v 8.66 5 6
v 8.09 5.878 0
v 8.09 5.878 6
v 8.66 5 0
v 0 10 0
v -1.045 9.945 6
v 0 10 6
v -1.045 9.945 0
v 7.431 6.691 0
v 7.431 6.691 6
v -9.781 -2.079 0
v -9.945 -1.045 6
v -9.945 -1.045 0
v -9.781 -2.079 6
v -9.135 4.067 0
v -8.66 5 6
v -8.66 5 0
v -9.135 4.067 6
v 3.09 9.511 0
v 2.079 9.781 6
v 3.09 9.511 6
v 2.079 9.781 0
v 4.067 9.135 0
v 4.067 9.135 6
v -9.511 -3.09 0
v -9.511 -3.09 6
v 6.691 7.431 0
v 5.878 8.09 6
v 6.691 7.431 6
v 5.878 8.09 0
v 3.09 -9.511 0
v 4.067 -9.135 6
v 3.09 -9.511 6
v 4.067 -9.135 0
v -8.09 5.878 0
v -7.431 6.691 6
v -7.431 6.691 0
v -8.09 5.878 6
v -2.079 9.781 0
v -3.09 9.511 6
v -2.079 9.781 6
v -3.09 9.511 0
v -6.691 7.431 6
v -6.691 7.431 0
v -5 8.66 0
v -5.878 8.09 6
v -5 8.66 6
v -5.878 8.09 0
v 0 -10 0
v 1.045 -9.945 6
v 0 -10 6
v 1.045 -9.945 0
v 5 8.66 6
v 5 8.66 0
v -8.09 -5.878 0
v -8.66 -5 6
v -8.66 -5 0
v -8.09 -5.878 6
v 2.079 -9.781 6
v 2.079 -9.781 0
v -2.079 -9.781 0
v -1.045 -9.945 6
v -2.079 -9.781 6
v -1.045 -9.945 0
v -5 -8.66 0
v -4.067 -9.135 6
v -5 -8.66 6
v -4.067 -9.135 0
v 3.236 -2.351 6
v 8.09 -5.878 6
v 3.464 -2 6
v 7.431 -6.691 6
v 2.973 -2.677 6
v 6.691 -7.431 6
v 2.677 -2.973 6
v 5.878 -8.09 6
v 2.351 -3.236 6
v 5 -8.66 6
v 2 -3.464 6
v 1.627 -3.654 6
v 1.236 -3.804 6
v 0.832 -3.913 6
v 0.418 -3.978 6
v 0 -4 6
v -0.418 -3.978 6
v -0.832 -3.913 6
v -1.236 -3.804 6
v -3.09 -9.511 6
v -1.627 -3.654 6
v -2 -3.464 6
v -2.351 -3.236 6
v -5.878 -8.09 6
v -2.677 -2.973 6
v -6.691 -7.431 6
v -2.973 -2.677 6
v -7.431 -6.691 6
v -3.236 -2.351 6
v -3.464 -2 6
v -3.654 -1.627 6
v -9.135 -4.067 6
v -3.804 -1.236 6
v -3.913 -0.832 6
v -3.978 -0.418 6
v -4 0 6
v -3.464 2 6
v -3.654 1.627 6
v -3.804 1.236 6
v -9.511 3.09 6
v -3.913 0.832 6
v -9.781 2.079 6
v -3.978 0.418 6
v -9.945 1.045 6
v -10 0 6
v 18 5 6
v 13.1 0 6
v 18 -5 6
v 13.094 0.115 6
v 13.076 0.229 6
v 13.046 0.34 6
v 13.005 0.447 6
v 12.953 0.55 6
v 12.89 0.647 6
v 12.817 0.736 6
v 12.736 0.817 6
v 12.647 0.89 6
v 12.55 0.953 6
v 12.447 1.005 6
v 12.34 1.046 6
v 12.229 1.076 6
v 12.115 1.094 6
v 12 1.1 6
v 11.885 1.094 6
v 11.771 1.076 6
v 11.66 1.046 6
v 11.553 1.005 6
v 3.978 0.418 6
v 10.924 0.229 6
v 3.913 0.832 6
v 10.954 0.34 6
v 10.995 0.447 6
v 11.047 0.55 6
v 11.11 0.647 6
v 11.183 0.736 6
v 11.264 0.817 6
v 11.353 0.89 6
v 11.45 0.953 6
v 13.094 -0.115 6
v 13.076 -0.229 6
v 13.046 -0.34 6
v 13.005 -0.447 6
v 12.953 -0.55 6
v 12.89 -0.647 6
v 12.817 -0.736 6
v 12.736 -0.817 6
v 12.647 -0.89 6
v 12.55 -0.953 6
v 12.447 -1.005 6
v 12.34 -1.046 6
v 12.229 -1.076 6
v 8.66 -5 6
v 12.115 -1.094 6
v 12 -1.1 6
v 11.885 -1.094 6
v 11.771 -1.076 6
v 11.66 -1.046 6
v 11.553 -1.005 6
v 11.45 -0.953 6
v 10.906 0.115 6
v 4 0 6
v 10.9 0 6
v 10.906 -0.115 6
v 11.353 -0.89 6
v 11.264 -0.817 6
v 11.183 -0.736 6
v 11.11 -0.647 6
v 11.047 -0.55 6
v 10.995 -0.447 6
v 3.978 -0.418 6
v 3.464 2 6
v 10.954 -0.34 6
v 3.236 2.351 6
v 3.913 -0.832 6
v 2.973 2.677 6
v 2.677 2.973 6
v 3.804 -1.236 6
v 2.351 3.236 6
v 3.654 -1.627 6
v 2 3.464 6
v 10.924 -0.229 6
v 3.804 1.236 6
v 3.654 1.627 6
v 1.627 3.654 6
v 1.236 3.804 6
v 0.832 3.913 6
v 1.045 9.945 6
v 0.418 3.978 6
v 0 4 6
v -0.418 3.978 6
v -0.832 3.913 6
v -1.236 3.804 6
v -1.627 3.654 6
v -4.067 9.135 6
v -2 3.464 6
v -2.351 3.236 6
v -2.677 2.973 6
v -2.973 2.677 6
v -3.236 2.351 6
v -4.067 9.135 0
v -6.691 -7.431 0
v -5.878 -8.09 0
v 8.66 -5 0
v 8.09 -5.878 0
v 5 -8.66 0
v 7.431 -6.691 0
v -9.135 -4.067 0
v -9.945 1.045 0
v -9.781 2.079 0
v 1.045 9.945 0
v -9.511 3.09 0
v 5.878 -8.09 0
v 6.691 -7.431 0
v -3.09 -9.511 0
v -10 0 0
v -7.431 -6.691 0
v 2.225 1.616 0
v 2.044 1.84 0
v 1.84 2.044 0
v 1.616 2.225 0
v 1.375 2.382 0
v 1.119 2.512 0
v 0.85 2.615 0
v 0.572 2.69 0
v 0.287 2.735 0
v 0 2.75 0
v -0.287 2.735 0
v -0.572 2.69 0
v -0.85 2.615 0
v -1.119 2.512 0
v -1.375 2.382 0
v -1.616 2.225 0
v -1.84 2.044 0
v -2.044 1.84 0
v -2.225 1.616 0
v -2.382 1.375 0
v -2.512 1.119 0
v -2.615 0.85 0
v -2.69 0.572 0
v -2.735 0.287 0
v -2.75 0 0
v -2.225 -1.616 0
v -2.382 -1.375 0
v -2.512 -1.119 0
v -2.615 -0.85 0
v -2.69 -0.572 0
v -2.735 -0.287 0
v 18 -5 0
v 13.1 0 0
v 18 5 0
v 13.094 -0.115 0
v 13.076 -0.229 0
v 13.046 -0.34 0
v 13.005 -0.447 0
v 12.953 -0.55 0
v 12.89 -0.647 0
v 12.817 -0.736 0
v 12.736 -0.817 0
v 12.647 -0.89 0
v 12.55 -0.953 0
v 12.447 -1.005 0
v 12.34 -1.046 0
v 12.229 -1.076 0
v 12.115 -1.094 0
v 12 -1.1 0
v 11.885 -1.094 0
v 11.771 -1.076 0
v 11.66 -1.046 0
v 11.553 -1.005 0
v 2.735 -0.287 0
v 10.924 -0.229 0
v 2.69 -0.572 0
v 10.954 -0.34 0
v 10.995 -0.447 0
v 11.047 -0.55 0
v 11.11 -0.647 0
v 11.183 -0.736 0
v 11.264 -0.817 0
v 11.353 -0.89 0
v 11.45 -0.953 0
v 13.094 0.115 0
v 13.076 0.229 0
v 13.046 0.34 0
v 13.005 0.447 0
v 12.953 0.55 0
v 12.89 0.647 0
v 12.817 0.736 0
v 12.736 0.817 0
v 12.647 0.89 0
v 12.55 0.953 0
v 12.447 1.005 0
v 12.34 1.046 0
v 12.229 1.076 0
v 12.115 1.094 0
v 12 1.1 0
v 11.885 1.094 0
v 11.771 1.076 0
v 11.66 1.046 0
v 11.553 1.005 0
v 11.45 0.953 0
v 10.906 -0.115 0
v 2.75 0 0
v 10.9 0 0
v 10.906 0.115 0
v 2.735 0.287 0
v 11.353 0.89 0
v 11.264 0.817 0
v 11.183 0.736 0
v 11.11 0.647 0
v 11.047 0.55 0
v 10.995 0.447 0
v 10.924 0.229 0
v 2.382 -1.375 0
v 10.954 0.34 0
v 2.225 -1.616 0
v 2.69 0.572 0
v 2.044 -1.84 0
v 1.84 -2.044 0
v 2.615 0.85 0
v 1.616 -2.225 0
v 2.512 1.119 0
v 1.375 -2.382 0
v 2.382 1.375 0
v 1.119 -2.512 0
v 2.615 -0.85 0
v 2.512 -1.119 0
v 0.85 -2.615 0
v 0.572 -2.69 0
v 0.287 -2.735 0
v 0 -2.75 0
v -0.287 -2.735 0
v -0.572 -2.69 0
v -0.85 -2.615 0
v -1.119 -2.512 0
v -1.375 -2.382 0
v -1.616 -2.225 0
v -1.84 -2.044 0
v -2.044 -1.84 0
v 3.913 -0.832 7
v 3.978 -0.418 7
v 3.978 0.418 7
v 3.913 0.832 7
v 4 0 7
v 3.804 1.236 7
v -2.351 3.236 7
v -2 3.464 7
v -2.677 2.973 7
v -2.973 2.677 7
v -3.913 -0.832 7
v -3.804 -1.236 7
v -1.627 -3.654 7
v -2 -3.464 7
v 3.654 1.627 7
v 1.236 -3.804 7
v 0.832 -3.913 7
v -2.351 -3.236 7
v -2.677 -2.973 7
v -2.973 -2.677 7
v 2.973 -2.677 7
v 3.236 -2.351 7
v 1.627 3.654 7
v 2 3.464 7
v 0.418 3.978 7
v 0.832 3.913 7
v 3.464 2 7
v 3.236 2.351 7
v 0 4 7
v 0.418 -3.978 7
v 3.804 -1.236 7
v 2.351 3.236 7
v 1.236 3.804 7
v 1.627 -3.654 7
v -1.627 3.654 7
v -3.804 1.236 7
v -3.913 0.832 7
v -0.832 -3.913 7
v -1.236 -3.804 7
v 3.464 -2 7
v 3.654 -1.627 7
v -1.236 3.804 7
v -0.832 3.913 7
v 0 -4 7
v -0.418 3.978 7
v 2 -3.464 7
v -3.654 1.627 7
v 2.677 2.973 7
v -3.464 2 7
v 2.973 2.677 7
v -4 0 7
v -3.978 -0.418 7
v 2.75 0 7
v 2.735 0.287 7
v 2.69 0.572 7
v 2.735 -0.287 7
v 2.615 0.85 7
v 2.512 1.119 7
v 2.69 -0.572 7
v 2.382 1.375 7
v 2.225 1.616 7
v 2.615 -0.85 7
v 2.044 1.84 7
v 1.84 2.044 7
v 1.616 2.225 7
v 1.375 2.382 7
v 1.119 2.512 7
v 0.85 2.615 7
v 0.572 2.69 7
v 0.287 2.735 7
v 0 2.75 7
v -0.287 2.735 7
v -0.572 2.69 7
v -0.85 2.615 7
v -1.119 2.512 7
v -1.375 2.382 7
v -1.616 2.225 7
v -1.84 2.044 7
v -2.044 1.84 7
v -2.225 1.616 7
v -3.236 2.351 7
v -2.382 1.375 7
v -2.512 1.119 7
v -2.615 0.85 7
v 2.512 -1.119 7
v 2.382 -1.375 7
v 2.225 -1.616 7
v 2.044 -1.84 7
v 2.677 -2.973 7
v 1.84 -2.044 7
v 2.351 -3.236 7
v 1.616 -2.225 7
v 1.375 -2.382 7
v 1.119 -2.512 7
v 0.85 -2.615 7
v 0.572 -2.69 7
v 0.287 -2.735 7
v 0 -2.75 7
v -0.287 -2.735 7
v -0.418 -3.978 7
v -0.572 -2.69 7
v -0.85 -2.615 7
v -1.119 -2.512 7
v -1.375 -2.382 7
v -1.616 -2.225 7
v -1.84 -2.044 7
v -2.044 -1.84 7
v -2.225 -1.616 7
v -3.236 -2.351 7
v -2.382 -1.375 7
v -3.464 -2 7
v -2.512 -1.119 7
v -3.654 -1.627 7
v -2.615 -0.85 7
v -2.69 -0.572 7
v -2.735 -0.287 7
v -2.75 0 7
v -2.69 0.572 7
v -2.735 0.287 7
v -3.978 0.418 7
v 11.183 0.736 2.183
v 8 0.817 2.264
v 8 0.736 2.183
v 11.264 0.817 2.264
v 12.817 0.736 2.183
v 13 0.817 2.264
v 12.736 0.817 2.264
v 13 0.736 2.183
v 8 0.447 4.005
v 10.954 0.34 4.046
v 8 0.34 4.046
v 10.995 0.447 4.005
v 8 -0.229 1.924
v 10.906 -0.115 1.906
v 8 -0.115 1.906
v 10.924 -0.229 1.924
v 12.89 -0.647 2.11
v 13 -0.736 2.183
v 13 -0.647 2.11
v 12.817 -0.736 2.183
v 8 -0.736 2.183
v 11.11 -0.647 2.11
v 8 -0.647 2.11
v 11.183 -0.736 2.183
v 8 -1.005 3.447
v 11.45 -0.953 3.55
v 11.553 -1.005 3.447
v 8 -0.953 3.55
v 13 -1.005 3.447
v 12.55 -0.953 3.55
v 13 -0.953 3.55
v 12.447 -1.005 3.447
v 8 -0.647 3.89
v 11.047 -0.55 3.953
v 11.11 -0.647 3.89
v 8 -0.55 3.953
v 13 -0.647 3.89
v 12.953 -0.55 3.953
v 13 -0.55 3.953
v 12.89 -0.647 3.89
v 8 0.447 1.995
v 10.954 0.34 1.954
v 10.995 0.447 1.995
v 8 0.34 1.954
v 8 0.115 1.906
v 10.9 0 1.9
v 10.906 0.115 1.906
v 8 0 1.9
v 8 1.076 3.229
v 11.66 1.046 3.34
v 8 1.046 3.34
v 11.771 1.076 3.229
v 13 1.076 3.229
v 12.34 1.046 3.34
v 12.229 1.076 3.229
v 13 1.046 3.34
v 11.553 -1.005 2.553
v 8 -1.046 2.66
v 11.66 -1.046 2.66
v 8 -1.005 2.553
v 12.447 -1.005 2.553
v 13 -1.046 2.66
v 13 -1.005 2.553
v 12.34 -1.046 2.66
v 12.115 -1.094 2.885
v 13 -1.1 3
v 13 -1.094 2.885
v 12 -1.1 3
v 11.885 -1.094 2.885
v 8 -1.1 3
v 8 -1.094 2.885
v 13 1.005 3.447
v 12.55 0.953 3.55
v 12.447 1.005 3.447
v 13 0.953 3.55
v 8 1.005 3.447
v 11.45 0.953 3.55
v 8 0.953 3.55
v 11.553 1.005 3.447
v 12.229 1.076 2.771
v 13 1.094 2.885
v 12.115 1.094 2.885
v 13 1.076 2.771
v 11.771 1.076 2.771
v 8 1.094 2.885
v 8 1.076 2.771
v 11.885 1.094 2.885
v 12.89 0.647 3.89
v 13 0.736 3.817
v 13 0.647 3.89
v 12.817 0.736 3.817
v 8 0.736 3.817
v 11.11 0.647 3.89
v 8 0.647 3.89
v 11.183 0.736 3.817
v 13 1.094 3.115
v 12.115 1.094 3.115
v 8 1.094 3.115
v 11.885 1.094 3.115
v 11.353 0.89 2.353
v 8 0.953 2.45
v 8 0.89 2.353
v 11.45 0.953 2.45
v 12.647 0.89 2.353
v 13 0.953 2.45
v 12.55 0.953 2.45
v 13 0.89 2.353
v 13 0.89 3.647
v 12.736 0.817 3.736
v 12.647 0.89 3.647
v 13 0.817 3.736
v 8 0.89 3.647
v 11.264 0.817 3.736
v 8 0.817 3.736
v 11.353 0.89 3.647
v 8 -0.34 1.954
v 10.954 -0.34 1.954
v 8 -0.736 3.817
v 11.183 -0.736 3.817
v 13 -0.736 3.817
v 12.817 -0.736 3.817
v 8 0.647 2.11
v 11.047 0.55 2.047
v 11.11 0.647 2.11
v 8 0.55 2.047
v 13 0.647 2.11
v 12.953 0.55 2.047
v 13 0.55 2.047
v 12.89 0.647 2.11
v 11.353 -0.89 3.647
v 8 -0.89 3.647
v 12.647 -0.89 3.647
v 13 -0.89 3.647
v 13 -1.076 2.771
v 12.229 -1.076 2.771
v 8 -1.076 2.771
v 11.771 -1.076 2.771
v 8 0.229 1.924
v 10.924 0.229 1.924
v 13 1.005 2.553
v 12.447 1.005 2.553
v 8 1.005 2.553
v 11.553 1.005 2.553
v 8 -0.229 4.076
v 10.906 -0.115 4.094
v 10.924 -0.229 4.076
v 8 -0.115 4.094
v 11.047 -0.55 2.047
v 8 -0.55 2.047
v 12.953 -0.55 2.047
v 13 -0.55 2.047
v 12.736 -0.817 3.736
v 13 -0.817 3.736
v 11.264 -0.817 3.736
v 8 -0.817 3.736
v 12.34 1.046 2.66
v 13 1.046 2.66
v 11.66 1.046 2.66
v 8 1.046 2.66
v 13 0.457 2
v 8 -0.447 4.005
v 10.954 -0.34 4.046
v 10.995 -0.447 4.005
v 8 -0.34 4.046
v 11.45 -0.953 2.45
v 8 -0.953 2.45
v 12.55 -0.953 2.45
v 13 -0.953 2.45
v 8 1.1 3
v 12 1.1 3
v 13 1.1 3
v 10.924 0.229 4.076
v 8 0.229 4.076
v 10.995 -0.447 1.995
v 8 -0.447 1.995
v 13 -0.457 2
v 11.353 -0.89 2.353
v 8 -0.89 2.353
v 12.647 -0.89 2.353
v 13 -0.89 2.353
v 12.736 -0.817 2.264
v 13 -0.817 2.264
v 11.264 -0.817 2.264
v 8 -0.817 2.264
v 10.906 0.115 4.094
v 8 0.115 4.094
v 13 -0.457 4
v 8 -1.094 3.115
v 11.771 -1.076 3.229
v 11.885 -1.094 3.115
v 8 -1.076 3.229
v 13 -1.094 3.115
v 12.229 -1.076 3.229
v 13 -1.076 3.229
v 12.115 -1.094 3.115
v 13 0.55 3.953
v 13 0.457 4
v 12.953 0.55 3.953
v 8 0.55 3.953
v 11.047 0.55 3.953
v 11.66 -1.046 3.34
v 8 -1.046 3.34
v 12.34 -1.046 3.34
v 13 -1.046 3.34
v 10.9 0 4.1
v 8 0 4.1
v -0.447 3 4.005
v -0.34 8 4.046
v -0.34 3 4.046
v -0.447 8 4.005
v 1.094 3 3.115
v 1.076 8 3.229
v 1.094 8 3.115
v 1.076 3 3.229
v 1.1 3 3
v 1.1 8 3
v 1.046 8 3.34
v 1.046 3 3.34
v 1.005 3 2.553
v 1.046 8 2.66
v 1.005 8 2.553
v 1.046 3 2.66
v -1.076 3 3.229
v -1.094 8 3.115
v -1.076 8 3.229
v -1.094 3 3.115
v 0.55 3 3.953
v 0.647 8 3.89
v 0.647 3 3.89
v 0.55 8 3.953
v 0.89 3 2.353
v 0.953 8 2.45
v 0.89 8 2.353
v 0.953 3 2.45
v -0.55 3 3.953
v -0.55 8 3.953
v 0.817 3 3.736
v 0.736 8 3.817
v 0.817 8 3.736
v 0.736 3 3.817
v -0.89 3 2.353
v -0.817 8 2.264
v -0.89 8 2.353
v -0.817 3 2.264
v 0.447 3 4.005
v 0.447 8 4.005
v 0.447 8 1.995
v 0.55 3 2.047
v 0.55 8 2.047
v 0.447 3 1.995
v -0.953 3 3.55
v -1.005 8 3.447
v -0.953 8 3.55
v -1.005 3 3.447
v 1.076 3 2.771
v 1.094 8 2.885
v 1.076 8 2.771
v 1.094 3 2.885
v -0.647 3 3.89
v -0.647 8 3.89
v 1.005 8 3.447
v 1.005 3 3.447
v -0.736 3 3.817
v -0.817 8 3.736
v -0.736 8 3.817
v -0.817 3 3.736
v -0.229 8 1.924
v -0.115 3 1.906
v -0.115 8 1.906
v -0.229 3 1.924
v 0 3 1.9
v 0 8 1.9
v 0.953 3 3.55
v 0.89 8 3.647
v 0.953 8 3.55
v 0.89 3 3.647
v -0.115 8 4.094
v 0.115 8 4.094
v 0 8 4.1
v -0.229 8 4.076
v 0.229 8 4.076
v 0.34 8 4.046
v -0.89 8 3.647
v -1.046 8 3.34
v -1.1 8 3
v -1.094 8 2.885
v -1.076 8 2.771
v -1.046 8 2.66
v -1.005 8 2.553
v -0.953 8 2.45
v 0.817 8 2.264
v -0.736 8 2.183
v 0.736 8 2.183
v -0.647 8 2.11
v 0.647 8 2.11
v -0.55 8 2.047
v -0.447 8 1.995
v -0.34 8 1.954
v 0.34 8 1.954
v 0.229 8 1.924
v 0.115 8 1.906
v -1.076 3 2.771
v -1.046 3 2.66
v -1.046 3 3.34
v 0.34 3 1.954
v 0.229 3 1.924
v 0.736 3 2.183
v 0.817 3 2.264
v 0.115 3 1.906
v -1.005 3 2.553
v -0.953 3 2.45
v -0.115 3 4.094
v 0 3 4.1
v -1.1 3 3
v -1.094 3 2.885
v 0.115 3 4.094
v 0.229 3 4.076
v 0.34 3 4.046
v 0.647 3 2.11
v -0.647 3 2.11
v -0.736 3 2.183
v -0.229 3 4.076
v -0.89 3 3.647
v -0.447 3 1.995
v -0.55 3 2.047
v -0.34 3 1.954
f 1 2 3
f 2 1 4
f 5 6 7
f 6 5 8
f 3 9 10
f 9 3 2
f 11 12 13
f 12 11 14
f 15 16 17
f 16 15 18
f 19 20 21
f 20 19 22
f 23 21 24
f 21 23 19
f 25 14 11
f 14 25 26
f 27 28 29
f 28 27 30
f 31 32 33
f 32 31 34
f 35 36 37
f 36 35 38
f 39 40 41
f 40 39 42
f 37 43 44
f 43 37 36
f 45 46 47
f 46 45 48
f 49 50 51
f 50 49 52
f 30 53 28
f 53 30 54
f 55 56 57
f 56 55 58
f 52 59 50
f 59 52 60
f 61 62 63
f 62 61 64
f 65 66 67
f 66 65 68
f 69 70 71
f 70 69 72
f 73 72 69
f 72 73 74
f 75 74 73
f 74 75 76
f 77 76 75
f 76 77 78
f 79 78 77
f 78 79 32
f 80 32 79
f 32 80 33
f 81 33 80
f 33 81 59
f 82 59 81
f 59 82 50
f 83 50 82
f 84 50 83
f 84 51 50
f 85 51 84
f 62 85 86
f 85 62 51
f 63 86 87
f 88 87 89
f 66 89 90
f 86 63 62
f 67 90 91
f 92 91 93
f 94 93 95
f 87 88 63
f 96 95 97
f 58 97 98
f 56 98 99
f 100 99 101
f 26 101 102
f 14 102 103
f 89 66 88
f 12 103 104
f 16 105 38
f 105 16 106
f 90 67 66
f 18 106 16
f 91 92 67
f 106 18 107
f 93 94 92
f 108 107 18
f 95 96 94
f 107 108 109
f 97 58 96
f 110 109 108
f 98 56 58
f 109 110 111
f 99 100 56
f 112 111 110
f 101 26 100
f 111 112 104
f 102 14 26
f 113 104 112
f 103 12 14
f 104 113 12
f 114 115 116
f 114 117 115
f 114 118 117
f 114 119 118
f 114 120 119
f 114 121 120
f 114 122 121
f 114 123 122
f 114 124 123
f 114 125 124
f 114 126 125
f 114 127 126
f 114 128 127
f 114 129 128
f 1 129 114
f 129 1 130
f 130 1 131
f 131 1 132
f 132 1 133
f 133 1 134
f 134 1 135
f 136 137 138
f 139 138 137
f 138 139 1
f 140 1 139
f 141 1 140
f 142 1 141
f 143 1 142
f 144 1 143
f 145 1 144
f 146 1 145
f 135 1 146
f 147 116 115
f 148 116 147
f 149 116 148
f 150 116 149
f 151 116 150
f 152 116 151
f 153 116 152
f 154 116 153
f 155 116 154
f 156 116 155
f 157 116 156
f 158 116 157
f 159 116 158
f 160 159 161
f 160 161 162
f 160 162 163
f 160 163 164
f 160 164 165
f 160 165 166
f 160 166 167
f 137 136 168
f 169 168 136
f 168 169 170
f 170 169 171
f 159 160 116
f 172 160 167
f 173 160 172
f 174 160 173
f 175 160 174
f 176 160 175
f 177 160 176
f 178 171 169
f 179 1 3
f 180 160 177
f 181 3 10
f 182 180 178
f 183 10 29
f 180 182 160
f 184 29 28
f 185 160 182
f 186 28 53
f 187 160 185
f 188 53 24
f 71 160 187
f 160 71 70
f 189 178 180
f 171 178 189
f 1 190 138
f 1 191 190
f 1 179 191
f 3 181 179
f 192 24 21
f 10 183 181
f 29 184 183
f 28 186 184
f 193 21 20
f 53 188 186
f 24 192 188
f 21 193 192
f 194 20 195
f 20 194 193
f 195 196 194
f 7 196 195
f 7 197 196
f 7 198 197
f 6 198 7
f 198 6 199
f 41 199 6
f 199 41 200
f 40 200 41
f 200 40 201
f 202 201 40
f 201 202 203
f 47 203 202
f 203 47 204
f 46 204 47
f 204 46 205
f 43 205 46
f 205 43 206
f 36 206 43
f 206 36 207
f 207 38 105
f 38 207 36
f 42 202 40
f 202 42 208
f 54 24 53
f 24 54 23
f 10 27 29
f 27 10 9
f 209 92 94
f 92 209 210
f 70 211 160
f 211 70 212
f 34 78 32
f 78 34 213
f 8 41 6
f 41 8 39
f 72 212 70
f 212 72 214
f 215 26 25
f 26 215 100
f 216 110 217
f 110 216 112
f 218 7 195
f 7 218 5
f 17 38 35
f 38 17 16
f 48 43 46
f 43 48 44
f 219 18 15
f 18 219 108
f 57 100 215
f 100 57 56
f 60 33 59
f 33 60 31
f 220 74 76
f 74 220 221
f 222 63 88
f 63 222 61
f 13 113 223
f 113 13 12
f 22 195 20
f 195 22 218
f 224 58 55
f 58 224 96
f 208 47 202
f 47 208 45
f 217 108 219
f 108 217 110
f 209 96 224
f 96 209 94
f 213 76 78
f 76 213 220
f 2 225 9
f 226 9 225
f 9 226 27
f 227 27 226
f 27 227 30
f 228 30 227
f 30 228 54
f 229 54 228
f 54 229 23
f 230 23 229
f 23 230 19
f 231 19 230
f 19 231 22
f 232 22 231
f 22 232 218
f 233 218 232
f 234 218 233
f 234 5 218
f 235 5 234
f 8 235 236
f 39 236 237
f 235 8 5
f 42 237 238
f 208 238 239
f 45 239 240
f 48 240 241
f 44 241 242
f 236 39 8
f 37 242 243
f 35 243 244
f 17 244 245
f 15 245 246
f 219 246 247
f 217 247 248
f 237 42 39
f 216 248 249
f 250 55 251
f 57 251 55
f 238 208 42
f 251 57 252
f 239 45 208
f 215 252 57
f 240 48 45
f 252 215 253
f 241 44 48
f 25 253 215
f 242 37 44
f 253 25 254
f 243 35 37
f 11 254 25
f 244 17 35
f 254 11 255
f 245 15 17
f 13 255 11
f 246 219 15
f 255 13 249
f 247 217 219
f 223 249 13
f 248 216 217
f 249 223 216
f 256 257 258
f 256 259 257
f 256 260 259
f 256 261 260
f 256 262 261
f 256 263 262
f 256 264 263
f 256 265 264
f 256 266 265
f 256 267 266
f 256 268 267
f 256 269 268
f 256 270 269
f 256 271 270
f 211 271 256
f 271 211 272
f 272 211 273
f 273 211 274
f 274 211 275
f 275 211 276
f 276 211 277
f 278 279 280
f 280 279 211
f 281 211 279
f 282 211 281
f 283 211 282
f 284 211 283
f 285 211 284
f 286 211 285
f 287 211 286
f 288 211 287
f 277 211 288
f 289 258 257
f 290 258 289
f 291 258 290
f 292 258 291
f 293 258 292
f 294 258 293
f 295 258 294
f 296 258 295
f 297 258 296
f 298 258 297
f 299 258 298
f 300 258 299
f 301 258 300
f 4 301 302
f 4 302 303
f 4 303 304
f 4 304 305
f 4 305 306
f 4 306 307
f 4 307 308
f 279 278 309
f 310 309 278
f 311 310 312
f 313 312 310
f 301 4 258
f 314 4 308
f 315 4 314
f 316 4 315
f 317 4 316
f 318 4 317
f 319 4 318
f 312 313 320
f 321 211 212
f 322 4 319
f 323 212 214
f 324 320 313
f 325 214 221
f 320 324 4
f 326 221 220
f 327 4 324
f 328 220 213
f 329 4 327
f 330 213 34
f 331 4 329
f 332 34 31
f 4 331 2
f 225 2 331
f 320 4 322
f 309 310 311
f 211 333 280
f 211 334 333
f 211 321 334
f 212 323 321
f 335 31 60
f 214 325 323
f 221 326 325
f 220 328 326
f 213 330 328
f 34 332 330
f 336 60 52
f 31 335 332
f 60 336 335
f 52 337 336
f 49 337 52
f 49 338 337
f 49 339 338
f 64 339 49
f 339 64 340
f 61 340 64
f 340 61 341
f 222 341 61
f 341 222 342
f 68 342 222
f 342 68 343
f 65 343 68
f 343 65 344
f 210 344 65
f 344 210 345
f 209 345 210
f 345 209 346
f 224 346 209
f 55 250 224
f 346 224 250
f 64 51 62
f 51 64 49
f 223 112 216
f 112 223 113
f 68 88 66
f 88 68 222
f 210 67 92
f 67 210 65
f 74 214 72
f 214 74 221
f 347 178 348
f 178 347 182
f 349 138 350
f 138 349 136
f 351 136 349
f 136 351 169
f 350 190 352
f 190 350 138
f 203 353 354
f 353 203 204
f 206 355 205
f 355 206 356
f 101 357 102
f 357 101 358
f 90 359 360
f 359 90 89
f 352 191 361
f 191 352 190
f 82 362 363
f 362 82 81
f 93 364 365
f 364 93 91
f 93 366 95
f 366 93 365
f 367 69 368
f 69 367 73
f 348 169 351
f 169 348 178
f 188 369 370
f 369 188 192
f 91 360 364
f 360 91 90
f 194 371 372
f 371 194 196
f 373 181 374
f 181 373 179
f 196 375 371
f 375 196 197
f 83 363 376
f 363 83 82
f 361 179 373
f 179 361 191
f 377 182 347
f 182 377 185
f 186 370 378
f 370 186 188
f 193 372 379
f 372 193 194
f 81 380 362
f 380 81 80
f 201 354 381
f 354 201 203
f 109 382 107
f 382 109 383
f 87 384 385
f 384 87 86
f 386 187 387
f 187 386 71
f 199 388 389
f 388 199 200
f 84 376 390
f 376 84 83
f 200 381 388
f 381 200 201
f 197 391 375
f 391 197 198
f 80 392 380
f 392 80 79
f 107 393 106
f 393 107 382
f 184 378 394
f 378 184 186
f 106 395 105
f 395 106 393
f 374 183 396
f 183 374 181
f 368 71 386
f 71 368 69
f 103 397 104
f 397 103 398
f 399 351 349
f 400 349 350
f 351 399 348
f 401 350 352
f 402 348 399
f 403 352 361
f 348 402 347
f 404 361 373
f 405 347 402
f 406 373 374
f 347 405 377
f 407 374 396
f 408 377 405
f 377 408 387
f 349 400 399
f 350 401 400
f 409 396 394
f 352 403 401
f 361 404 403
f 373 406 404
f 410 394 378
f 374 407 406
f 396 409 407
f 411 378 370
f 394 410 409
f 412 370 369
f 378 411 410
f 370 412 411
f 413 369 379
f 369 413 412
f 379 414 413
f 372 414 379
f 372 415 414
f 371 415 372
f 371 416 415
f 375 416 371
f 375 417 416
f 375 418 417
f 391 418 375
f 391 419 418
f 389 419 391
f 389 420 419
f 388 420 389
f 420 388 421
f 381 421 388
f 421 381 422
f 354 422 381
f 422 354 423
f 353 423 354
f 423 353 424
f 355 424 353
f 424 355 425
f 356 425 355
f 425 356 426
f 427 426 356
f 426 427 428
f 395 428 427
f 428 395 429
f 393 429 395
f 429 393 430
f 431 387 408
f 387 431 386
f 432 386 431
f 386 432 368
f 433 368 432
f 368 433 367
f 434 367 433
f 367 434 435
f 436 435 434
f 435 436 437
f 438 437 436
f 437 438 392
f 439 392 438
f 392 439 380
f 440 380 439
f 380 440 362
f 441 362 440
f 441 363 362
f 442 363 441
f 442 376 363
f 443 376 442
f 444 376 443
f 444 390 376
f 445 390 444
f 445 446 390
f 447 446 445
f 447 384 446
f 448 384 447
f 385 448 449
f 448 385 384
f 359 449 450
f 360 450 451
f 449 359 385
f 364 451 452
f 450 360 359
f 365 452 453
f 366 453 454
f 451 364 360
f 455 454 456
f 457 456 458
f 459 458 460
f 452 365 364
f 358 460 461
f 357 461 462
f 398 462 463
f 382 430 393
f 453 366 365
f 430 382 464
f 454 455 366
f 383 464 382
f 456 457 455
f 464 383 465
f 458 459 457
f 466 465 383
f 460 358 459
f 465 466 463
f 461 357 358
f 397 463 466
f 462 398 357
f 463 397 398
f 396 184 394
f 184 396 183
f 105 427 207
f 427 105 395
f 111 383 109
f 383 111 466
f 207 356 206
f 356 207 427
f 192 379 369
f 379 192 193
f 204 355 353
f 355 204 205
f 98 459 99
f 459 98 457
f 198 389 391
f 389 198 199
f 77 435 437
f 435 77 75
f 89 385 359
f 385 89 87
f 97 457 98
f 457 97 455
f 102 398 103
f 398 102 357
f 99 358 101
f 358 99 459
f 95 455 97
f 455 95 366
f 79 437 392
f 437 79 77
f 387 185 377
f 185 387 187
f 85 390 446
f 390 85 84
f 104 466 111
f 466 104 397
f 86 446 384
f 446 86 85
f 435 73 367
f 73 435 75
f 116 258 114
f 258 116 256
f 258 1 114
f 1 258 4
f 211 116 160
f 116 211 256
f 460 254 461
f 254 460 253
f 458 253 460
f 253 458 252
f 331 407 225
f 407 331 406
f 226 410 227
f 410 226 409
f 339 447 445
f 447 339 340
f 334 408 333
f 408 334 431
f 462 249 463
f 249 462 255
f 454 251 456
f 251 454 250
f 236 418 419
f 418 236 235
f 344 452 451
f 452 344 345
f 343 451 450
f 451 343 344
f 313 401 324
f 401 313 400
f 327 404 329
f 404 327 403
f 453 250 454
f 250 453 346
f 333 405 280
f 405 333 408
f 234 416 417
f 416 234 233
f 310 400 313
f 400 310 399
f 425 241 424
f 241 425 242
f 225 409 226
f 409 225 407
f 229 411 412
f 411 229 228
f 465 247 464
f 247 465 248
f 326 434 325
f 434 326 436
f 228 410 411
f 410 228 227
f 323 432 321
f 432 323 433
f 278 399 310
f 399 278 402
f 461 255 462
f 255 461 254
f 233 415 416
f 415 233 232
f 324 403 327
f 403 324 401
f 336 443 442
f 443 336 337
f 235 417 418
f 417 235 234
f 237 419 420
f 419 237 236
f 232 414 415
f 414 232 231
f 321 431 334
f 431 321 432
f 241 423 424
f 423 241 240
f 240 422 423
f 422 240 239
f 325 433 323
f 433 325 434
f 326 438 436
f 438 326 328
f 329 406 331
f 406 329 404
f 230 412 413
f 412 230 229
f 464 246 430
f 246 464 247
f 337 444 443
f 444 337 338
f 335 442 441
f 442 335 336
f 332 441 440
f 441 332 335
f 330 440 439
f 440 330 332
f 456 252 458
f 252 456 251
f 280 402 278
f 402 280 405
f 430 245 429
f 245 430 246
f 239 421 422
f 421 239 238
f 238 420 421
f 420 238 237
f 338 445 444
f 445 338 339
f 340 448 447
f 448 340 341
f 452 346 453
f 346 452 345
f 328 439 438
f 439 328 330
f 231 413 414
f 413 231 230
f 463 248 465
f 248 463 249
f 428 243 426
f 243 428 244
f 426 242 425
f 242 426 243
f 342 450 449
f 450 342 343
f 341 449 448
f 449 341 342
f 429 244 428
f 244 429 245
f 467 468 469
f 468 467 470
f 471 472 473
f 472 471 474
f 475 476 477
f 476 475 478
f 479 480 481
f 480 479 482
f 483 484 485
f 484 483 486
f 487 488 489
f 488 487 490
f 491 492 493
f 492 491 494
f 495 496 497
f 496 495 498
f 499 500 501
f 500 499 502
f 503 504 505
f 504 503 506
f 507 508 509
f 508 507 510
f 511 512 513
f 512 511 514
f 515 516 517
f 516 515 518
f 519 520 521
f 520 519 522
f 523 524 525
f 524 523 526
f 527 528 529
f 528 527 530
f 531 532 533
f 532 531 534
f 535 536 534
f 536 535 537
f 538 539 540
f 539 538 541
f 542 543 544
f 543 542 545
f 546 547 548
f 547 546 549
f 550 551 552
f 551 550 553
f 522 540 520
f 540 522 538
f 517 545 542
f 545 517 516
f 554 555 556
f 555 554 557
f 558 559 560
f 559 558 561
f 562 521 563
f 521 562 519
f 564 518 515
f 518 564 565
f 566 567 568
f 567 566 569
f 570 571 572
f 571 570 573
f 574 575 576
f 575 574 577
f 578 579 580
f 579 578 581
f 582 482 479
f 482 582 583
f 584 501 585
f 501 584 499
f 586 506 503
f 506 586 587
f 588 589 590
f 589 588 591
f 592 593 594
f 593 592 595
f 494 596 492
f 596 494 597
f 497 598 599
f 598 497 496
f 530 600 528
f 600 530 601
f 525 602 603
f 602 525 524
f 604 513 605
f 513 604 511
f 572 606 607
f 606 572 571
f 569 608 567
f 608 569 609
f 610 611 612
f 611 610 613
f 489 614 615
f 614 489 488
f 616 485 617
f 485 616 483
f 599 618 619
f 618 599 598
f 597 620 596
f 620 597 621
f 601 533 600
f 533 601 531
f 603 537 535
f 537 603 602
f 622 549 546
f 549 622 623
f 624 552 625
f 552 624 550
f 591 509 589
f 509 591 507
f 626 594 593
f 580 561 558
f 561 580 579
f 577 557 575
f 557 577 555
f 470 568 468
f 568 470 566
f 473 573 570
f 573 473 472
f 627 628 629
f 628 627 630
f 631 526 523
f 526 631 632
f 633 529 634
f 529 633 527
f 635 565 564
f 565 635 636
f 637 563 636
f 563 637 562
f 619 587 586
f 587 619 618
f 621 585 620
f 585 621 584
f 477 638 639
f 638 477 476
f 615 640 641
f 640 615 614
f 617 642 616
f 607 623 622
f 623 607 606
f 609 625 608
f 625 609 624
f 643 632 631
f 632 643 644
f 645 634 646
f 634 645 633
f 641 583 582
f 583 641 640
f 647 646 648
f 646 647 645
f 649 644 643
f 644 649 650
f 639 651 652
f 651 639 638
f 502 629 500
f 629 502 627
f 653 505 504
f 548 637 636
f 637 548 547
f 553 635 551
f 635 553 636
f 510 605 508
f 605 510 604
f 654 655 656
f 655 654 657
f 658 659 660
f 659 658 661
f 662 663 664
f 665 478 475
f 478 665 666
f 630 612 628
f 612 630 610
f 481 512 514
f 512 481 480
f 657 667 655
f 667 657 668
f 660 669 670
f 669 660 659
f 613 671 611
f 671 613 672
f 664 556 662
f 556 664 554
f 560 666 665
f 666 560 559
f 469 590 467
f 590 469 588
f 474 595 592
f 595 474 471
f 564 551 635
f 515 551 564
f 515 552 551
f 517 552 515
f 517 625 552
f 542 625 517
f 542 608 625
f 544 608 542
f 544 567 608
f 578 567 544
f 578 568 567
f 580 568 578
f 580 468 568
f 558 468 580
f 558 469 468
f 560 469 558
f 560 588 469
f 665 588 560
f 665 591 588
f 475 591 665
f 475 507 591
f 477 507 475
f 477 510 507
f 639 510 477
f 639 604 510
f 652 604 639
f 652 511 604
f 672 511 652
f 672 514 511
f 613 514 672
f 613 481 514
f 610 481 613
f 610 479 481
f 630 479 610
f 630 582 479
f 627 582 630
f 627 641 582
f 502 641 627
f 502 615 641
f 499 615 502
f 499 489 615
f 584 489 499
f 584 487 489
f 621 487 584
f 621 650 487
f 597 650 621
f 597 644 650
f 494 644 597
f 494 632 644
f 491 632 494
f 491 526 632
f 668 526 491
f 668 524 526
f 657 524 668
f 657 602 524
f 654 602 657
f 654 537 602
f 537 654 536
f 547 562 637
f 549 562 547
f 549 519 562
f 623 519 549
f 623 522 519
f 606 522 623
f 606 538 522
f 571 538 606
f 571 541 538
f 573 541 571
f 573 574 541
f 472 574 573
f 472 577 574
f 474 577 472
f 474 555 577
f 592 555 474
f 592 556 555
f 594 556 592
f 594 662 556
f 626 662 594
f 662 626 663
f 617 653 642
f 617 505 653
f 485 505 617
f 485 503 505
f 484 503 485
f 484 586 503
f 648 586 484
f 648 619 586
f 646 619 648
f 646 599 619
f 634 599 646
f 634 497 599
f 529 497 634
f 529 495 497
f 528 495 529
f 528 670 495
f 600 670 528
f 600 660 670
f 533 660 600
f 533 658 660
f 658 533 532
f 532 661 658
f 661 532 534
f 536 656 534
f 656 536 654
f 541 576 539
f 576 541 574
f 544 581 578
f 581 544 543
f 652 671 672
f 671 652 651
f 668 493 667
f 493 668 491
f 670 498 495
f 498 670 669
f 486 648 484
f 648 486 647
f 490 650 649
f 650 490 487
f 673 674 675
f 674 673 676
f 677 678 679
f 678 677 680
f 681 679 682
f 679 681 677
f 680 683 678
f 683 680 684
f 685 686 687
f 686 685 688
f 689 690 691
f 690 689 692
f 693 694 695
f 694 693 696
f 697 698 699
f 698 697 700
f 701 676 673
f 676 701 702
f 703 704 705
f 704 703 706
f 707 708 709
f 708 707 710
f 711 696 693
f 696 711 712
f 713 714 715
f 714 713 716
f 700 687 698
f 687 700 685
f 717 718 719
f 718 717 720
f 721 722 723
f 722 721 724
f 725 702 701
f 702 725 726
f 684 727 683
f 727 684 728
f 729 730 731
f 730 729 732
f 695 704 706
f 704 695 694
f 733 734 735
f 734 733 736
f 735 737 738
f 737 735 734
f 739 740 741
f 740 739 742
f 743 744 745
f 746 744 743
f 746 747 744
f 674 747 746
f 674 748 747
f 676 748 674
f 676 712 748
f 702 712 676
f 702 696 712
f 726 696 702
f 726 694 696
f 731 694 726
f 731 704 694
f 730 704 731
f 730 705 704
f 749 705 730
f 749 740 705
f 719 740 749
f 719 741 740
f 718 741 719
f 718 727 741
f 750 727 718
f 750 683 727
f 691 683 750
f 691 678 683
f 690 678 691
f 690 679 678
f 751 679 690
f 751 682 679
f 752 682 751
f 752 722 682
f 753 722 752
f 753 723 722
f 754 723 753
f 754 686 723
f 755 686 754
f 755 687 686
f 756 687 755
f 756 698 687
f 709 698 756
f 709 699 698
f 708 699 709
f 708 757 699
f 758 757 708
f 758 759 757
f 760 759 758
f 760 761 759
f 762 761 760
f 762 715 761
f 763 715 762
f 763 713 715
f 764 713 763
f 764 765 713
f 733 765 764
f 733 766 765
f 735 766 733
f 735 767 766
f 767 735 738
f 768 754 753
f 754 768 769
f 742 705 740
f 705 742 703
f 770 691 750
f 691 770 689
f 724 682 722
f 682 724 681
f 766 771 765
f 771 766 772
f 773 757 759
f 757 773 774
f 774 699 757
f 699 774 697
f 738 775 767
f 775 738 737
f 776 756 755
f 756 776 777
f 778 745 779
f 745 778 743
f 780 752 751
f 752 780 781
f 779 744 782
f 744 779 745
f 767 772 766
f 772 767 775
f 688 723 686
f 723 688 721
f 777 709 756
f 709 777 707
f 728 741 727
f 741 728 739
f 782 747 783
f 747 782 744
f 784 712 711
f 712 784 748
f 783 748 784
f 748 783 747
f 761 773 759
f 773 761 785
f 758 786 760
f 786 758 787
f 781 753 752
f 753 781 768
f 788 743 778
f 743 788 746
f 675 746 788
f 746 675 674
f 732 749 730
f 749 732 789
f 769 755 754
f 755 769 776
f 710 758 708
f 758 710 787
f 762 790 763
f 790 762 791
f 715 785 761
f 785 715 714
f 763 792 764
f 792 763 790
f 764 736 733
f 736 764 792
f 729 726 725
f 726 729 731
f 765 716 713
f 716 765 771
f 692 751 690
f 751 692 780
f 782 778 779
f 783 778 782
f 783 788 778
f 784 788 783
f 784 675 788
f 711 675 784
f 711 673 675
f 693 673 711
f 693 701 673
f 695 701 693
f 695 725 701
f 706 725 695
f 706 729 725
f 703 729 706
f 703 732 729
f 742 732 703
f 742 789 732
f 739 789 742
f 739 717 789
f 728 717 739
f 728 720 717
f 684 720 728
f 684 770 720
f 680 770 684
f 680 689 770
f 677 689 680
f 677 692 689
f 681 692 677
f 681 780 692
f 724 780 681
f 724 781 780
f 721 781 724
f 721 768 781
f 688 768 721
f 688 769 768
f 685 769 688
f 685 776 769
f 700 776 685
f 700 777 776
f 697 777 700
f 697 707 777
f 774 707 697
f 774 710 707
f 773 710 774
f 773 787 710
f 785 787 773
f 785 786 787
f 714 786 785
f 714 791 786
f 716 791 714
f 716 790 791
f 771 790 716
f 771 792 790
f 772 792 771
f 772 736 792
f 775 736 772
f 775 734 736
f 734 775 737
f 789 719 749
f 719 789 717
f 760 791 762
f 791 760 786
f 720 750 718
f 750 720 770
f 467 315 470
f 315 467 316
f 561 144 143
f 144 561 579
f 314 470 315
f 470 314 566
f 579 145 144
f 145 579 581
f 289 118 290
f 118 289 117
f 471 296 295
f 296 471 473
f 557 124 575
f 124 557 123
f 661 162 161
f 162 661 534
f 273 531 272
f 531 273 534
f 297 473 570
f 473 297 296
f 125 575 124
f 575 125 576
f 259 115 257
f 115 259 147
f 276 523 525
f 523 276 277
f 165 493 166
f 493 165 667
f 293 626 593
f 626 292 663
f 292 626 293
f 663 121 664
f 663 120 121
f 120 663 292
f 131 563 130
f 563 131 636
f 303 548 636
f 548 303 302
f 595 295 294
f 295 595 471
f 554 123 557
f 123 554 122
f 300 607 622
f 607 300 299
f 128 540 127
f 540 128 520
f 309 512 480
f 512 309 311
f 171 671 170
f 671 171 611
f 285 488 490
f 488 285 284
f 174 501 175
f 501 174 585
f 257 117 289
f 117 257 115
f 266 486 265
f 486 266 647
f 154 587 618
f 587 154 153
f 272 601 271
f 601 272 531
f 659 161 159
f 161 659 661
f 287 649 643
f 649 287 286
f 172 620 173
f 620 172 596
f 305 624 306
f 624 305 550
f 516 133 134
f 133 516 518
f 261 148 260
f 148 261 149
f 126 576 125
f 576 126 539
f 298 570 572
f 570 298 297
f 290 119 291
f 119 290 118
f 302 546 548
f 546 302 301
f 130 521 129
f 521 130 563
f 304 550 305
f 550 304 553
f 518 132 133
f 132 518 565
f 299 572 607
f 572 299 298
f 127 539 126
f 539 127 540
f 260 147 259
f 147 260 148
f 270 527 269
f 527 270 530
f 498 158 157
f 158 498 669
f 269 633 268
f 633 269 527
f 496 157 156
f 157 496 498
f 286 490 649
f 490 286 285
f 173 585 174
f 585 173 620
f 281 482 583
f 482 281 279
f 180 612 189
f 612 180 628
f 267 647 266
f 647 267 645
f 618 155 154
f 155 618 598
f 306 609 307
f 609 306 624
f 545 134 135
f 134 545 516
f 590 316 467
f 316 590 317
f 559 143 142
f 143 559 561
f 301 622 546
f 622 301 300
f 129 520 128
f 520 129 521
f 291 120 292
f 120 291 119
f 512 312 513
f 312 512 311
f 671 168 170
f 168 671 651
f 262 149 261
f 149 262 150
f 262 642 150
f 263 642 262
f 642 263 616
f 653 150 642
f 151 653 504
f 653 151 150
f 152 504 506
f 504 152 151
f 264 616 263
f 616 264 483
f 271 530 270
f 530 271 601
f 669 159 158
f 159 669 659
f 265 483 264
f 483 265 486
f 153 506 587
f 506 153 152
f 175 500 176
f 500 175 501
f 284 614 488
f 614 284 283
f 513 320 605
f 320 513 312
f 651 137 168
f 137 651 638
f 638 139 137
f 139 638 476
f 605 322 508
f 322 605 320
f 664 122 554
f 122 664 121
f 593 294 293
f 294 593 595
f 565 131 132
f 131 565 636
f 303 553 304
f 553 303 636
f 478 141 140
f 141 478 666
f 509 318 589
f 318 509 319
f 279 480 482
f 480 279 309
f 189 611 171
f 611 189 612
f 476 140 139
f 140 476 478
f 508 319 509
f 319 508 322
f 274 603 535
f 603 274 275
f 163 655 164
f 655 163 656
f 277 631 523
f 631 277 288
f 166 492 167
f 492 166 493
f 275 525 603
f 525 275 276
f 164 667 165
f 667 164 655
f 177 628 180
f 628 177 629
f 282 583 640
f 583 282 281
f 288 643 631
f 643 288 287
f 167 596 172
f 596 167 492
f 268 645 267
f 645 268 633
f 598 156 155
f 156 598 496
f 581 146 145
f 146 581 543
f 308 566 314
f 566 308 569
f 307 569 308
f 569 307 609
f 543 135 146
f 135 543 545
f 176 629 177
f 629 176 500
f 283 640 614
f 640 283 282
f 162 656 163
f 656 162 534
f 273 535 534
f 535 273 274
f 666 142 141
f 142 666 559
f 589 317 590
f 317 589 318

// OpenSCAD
// ============================================================================
// 07_Coupler
// ============================================================================
// SeaBreeze-Inspector 3DOF 机械臂 — 舵盘联轴器/转接器
// 连接 SG90 舵盘与连杆，适配舵机轴 φ4.8mm
// 参数与代码完全吻合: L1=55, L2=45, L3=35, base_height=25
// 生成日期: 2026
// ============================================================================

$fn = 60;

L1 = 55;
L2 = 45;
L3 = 35;
BASE_H = 25;

// SG90 舵机参数 (mm)
SG90_BODY_W = 22.2;
SG90_BODY_H = 11.8;
SG90_BODY_L = 31.0;
SG90_AXIS_H = 26.5;
SG90_AXIS_D = 4.8;
SG90_EAR_HOLE_D = 2.0;
SG90_EAR_SPAN_X = 10.0;
SG90_EAR_SPAN_Y = 22.5;

// 紧固件
M2_D = 2.2;
M2p5_D = 2.7;
M3_D = 3.2;

// 打印参数
WALL = 2.0;
LINK_W = 15.0;
LINK_T = 3.0;


// 联轴器参数（基于 STL 包围盒 30 x 20 x 6）
DISC_D = 20;        // 主圆盘直径
DISC_T = 6;         // 主圆盘厚度
AXIS_HOLE_D = 5.5;  // 中心轴孔 — 适配 SG90 舵机轴 φ4.8mm，留 0.7mm 间隙
SET_SCREW_D = M2_D; // 顶丝孔

// 偏心法兰（连接连杆）
FLANGE_OFF_X = 12;  // 法兰偏移距离
FLANGE_W = 12;      // 法兰宽度
FLANGE_D = 10;      // 法兰深度
FLANGE_HOLE_D = M2_D;

module coupler() {
    difference() {
        union() {
            // 主圆盘（连接舵盘）
            cylinder(h=DISC_T, d=DISC_D);
            
            // 中心轴套加强
            cylinder(h=DISC_T + 1, d=8);
            
            // 偏心法兰（连接连杆）
            translate([FLANGE_OFF_X, 0, DISC_T/2])
                cube([FLANGE_W, FLANGE_D, DISC_T], center=true);
        }
        
        // 中心轴孔（通孔）
        translate([0, 0, -1])
            cylinder(h=DISC_T + 3, d=AXIS_HOLE_D);
        
        // 顶丝孔（M2，垂直于轴，2个互成90°）
        translate([DISC_D/2 - 2, 0, DISC_T/2])
            rotate([0, 90, 0])
            cylinder(h=5, d=SET_SCREW_D);
        translate([0, DISC_D/2 - 2, DISC_T/2])
            rotate([90, 0, 0])
            cylinder(h=5, d=SET_SCREW_D);
        
        // 法兰安装孔
        translate([FLANGE_OFF_X, 0, -1])
            cylinder(h=DISC_T+2, d=FLANGE_HOLE_D);
    }
}

coupler();
